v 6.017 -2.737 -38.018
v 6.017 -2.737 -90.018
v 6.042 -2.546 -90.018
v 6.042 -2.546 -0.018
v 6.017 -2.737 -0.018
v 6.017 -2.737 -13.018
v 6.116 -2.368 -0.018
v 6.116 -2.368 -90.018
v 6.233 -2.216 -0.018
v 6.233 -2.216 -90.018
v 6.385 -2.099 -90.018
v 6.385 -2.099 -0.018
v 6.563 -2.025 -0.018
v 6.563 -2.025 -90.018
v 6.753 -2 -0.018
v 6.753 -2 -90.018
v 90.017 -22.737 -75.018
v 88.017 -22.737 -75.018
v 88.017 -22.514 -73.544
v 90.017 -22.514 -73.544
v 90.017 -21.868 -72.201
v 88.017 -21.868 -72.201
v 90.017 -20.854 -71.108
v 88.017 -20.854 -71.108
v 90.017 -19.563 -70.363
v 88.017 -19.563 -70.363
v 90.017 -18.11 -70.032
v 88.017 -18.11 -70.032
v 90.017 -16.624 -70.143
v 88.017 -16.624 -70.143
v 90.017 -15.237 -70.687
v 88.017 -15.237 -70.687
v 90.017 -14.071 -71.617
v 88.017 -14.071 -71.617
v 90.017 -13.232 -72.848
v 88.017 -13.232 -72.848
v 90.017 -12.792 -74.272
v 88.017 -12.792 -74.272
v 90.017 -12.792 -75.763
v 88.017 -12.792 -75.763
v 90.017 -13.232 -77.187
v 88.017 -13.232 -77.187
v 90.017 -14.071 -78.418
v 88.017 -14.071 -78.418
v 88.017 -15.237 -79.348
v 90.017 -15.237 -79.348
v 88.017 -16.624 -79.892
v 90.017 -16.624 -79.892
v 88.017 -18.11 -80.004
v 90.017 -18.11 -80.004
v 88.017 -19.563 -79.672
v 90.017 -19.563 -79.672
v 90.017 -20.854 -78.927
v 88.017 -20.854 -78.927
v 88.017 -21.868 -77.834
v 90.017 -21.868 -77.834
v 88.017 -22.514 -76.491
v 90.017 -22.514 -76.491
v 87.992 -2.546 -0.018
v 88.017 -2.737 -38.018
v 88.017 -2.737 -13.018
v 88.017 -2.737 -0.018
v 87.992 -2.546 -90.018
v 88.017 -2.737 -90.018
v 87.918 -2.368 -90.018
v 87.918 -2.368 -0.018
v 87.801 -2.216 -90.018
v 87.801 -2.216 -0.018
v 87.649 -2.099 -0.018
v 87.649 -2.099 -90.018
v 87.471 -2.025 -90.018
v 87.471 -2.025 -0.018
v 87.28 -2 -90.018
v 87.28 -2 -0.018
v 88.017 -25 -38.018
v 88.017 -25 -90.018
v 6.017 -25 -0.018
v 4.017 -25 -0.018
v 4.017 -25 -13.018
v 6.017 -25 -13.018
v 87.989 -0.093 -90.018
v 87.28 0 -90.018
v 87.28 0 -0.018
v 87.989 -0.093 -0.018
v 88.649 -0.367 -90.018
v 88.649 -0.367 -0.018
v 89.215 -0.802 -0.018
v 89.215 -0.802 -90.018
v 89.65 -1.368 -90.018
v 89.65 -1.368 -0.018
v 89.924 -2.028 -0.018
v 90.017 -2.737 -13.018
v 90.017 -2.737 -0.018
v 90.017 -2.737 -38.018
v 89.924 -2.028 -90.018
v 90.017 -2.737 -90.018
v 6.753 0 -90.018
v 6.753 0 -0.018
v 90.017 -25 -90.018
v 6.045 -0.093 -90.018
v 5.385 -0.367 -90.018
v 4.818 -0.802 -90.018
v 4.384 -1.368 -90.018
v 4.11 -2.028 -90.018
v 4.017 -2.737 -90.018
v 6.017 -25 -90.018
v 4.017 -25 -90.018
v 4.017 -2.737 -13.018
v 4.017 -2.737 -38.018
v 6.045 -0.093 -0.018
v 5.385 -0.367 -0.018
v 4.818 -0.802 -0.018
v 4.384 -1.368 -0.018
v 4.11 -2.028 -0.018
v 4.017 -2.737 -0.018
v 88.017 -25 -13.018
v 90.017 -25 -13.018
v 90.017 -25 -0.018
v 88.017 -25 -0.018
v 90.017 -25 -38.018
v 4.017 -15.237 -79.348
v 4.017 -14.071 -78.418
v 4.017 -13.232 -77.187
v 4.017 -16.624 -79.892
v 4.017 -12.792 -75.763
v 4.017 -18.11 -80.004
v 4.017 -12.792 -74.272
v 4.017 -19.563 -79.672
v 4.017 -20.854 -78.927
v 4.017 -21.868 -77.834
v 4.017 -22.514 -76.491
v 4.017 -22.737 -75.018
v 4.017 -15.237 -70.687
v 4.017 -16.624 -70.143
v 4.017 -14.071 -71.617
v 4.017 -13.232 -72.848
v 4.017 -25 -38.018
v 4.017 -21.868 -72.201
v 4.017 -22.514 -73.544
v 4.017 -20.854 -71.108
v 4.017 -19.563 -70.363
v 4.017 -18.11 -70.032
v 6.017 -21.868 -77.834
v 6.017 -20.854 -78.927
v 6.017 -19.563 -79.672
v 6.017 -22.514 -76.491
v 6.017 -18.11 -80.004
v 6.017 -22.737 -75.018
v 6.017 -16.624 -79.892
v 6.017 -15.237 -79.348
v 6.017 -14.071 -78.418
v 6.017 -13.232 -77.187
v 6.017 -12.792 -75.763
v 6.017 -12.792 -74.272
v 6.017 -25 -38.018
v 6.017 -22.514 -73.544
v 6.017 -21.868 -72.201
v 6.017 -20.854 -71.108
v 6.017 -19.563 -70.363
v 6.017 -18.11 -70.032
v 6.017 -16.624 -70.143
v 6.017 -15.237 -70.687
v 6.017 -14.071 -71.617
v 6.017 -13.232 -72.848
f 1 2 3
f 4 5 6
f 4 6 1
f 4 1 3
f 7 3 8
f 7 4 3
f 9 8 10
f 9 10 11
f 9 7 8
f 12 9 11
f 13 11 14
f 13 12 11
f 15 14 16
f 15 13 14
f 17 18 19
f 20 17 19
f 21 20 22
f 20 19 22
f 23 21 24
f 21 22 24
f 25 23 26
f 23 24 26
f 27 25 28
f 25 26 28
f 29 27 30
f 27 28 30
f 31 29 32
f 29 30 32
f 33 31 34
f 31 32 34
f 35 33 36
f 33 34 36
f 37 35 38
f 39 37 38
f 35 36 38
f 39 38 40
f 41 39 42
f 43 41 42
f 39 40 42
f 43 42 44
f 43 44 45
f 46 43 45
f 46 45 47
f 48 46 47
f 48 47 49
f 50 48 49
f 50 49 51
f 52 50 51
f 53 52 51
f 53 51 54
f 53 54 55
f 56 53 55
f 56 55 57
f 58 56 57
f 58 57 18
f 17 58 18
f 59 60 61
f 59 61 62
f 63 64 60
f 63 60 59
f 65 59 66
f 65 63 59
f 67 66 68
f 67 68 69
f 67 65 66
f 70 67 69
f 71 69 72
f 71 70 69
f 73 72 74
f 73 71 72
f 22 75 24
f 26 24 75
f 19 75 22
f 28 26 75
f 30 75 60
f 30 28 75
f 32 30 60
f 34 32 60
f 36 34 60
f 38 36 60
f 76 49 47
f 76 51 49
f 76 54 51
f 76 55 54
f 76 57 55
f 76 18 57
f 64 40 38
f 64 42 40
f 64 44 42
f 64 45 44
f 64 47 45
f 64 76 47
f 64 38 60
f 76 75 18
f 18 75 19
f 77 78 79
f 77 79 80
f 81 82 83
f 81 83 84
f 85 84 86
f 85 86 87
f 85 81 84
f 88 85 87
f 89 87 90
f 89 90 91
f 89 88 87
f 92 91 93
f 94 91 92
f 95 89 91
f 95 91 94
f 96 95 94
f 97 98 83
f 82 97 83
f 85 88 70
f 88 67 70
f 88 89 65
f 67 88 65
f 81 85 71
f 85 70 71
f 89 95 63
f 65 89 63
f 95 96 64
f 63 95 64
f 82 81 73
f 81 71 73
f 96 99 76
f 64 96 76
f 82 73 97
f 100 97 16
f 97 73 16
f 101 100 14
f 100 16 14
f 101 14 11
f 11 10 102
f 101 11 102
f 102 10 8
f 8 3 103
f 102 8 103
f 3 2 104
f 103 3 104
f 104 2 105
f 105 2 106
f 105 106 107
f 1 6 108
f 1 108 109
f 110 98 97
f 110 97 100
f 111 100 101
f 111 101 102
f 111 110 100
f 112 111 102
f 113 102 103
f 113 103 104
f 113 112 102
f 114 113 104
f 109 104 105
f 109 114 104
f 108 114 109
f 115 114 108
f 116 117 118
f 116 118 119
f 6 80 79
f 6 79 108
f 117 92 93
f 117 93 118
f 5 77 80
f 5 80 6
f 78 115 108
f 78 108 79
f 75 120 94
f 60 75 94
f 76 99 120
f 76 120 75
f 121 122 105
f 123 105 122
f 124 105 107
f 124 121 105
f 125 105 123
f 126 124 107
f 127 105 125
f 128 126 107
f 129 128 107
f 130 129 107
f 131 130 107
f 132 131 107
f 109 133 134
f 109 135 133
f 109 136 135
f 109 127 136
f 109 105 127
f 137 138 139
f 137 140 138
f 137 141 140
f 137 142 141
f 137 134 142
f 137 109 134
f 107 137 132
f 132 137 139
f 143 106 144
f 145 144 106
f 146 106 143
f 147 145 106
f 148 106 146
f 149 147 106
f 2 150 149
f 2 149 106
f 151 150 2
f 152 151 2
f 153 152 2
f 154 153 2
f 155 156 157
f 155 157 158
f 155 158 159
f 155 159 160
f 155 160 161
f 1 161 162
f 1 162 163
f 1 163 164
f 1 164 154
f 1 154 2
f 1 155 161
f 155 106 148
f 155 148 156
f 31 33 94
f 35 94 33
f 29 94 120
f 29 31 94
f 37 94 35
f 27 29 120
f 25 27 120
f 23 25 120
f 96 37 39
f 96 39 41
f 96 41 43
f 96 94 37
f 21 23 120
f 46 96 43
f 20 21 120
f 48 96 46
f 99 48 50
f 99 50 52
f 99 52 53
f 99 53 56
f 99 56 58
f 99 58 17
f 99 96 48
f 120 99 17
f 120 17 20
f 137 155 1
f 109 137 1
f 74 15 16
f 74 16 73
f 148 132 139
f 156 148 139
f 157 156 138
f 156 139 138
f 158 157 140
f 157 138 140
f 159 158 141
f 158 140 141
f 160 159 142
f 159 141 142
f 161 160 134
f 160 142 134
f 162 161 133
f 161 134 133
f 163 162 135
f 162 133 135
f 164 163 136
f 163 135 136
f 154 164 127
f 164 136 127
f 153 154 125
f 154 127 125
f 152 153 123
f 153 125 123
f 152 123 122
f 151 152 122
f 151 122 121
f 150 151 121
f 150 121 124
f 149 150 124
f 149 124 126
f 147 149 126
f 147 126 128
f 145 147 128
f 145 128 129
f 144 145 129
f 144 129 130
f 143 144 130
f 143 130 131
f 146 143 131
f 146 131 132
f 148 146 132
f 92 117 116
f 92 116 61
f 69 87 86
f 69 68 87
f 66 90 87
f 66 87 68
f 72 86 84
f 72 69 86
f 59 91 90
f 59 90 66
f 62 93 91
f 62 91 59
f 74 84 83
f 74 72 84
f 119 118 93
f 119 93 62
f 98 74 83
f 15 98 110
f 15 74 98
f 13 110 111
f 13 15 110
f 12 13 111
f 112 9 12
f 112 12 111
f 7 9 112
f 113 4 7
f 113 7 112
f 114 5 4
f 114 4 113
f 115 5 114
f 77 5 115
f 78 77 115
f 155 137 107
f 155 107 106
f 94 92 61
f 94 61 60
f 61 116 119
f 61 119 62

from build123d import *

# Parameters (mm, degrees)
SKETCH1_W                    = 86
SKETCH1_H                    = 90
BASE_FLANGE1_DEPTH           = 2
EDGE_FLANGE1_STRIP_W         = 9.4732
EDGE_FLANGE1_STRIP_H         = 2
EDGE_FLANGE1_STRIP_CUT_DEPTH = 90
EDGE_FLANGE1_DEPTH           = 90
EDGE_FLANGE2_STRIP_W         = 9.4732
EDGE_FLANGE2_STRIP_H         = 2
EDGE_FLANGE2_STRIP_CUT_DEPTH = 90
EDGE_FLANGE2_DEPTH           = 90
SKETCH13_W                   = 25
SKETCH13_H                   = 22.2634
CUT_EXTRUDE1_DEPTH           = 127.980922721
SKETCH15_R                   = 5
CUT_EXTRUDE2_DEPTH           = 127.980922721


# Sheet-metal steps are written as plain solids
with BuildPart() as part:
    # Sketch1 → Base-Flange1 (new body)
    with BuildSketch(Plane(origin=(0, 0, 0), x_dir=(1, 0, 0), z_dir=(0, 1, 0))):
        with Locations((47.016874378, 45.0175246)):
            Rectangle(SKETCH1_W, SKETCH1_H)
    extrude(amount=-BASE_FLANGE1_DEPTH)

    # Edge-Flange1 strip (across the edge) → Edge-Flange1 strip cut (cut)
    with BuildSketch(Plane(origin=(90.016874378, -2, -90.0175246), x_dir=(-1, 0, 0), z_dir=(0, 0, 1))):
        with Locations((-2, -1)):
            Rectangle(EDGE_FLANGE1_STRIP_W, EDGE_FLANGE1_STRIP_H)
    extrude(amount=EDGE_FLANGE1_STRIP_CUT_DEPTH, mode=Mode.SUBTRACT)

    # Edge-Flange1 section (across the edge) → Edge-Flange1 (add)
    with BuildSketch(Plane(origin=(90.016874378, -2, -90.0175246), x_dir=(-1, 0, 0), z_dir=(0, 0, 1))):
        with BuildLine():
            Line((0, 0.7366), (0, 23))
            Line((0, 23), (2, 23))
            Line((2, 23), (2, 0.7366))
            ThreePointArc((2, 0.7366), (2.215745145, 0.215745145), (2.7366, 0))
            Line((2.7366, 0), (2.7366, -2))
            ThreePointArc((2.7366, -2), (0.801531583, -1.198468417), (0, 0.7366))
        make_face()
    extrude(amount=EDGE_FLANGE1_DEPTH)

    # Edge-Flange2 strip (across the edge) → Edge-Flange2 strip cut (cut)
    with BuildSketch(Plane(origin=(4.016874378, -2, -0.0175246), x_dir=(1, 0, 0), z_dir=(0, 0, -1))):
        with Locations((-2, -1)):
            Rectangle(EDGE_FLANGE2_STRIP_W, EDGE_FLANGE2_STRIP_H)
    extrude(amount=EDGE_FLANGE2_STRIP_CUT_DEPTH, mode=Mode.SUBTRACT)

    # Edge-Flange2 section (across the edge) → Edge-Flange2 (add)
    with BuildSketch(Plane(origin=(4.016874378, -2, -0.0175246), x_dir=(1, 0, 0), z_dir=(0, 0, -1))):
        with BuildLine():
            Line((0, 0.7366), (0, 23))
            Line((0, 23), (2, 23))
            Line((2, 23), (2, 0.7366))
            ThreePointArc((2, 0.7366), (2.215745145, 0.215745145), (2.7366, 0))
            Line((2.7366, 0), (2.7366, -2))
            ThreePointArc((2.7366, -2), (0.801531583, -1.198468417), (0, 0.7366))
        make_face()
    extrude(amount=EDGE_FLANGE2_DEPTH)

    # Sketch13 → Cut-Extrude1 (cut, through all)
    with BuildSketch(Plane(origin=(90.016874378, 0, 0), x_dir=(0, 0, -1), z_dir=(1, 0, 0))):
        with Locations((25.5175246, -13.8683)):
            Rectangle(SKETCH13_W, SKETCH13_H)
    extrude(amount=-CUT_EXTRUDE1_DEPTH, mode=Mode.SUBTRACT)

    # Sketch15 → Cut-Extrude2 (cut, through all)
    with BuildSketch(Plane.ZY.offset(-4.016874378)):
        with Locations(Location((-75.0175246, -17.7366, 0), (0, 0, 270))):
            Circle(SKETCH15_R)
    extrude(amount=-CUT_EXTRUDE2_DEPTH, mode=Mode.SUBTRACT)


solid = part.part
